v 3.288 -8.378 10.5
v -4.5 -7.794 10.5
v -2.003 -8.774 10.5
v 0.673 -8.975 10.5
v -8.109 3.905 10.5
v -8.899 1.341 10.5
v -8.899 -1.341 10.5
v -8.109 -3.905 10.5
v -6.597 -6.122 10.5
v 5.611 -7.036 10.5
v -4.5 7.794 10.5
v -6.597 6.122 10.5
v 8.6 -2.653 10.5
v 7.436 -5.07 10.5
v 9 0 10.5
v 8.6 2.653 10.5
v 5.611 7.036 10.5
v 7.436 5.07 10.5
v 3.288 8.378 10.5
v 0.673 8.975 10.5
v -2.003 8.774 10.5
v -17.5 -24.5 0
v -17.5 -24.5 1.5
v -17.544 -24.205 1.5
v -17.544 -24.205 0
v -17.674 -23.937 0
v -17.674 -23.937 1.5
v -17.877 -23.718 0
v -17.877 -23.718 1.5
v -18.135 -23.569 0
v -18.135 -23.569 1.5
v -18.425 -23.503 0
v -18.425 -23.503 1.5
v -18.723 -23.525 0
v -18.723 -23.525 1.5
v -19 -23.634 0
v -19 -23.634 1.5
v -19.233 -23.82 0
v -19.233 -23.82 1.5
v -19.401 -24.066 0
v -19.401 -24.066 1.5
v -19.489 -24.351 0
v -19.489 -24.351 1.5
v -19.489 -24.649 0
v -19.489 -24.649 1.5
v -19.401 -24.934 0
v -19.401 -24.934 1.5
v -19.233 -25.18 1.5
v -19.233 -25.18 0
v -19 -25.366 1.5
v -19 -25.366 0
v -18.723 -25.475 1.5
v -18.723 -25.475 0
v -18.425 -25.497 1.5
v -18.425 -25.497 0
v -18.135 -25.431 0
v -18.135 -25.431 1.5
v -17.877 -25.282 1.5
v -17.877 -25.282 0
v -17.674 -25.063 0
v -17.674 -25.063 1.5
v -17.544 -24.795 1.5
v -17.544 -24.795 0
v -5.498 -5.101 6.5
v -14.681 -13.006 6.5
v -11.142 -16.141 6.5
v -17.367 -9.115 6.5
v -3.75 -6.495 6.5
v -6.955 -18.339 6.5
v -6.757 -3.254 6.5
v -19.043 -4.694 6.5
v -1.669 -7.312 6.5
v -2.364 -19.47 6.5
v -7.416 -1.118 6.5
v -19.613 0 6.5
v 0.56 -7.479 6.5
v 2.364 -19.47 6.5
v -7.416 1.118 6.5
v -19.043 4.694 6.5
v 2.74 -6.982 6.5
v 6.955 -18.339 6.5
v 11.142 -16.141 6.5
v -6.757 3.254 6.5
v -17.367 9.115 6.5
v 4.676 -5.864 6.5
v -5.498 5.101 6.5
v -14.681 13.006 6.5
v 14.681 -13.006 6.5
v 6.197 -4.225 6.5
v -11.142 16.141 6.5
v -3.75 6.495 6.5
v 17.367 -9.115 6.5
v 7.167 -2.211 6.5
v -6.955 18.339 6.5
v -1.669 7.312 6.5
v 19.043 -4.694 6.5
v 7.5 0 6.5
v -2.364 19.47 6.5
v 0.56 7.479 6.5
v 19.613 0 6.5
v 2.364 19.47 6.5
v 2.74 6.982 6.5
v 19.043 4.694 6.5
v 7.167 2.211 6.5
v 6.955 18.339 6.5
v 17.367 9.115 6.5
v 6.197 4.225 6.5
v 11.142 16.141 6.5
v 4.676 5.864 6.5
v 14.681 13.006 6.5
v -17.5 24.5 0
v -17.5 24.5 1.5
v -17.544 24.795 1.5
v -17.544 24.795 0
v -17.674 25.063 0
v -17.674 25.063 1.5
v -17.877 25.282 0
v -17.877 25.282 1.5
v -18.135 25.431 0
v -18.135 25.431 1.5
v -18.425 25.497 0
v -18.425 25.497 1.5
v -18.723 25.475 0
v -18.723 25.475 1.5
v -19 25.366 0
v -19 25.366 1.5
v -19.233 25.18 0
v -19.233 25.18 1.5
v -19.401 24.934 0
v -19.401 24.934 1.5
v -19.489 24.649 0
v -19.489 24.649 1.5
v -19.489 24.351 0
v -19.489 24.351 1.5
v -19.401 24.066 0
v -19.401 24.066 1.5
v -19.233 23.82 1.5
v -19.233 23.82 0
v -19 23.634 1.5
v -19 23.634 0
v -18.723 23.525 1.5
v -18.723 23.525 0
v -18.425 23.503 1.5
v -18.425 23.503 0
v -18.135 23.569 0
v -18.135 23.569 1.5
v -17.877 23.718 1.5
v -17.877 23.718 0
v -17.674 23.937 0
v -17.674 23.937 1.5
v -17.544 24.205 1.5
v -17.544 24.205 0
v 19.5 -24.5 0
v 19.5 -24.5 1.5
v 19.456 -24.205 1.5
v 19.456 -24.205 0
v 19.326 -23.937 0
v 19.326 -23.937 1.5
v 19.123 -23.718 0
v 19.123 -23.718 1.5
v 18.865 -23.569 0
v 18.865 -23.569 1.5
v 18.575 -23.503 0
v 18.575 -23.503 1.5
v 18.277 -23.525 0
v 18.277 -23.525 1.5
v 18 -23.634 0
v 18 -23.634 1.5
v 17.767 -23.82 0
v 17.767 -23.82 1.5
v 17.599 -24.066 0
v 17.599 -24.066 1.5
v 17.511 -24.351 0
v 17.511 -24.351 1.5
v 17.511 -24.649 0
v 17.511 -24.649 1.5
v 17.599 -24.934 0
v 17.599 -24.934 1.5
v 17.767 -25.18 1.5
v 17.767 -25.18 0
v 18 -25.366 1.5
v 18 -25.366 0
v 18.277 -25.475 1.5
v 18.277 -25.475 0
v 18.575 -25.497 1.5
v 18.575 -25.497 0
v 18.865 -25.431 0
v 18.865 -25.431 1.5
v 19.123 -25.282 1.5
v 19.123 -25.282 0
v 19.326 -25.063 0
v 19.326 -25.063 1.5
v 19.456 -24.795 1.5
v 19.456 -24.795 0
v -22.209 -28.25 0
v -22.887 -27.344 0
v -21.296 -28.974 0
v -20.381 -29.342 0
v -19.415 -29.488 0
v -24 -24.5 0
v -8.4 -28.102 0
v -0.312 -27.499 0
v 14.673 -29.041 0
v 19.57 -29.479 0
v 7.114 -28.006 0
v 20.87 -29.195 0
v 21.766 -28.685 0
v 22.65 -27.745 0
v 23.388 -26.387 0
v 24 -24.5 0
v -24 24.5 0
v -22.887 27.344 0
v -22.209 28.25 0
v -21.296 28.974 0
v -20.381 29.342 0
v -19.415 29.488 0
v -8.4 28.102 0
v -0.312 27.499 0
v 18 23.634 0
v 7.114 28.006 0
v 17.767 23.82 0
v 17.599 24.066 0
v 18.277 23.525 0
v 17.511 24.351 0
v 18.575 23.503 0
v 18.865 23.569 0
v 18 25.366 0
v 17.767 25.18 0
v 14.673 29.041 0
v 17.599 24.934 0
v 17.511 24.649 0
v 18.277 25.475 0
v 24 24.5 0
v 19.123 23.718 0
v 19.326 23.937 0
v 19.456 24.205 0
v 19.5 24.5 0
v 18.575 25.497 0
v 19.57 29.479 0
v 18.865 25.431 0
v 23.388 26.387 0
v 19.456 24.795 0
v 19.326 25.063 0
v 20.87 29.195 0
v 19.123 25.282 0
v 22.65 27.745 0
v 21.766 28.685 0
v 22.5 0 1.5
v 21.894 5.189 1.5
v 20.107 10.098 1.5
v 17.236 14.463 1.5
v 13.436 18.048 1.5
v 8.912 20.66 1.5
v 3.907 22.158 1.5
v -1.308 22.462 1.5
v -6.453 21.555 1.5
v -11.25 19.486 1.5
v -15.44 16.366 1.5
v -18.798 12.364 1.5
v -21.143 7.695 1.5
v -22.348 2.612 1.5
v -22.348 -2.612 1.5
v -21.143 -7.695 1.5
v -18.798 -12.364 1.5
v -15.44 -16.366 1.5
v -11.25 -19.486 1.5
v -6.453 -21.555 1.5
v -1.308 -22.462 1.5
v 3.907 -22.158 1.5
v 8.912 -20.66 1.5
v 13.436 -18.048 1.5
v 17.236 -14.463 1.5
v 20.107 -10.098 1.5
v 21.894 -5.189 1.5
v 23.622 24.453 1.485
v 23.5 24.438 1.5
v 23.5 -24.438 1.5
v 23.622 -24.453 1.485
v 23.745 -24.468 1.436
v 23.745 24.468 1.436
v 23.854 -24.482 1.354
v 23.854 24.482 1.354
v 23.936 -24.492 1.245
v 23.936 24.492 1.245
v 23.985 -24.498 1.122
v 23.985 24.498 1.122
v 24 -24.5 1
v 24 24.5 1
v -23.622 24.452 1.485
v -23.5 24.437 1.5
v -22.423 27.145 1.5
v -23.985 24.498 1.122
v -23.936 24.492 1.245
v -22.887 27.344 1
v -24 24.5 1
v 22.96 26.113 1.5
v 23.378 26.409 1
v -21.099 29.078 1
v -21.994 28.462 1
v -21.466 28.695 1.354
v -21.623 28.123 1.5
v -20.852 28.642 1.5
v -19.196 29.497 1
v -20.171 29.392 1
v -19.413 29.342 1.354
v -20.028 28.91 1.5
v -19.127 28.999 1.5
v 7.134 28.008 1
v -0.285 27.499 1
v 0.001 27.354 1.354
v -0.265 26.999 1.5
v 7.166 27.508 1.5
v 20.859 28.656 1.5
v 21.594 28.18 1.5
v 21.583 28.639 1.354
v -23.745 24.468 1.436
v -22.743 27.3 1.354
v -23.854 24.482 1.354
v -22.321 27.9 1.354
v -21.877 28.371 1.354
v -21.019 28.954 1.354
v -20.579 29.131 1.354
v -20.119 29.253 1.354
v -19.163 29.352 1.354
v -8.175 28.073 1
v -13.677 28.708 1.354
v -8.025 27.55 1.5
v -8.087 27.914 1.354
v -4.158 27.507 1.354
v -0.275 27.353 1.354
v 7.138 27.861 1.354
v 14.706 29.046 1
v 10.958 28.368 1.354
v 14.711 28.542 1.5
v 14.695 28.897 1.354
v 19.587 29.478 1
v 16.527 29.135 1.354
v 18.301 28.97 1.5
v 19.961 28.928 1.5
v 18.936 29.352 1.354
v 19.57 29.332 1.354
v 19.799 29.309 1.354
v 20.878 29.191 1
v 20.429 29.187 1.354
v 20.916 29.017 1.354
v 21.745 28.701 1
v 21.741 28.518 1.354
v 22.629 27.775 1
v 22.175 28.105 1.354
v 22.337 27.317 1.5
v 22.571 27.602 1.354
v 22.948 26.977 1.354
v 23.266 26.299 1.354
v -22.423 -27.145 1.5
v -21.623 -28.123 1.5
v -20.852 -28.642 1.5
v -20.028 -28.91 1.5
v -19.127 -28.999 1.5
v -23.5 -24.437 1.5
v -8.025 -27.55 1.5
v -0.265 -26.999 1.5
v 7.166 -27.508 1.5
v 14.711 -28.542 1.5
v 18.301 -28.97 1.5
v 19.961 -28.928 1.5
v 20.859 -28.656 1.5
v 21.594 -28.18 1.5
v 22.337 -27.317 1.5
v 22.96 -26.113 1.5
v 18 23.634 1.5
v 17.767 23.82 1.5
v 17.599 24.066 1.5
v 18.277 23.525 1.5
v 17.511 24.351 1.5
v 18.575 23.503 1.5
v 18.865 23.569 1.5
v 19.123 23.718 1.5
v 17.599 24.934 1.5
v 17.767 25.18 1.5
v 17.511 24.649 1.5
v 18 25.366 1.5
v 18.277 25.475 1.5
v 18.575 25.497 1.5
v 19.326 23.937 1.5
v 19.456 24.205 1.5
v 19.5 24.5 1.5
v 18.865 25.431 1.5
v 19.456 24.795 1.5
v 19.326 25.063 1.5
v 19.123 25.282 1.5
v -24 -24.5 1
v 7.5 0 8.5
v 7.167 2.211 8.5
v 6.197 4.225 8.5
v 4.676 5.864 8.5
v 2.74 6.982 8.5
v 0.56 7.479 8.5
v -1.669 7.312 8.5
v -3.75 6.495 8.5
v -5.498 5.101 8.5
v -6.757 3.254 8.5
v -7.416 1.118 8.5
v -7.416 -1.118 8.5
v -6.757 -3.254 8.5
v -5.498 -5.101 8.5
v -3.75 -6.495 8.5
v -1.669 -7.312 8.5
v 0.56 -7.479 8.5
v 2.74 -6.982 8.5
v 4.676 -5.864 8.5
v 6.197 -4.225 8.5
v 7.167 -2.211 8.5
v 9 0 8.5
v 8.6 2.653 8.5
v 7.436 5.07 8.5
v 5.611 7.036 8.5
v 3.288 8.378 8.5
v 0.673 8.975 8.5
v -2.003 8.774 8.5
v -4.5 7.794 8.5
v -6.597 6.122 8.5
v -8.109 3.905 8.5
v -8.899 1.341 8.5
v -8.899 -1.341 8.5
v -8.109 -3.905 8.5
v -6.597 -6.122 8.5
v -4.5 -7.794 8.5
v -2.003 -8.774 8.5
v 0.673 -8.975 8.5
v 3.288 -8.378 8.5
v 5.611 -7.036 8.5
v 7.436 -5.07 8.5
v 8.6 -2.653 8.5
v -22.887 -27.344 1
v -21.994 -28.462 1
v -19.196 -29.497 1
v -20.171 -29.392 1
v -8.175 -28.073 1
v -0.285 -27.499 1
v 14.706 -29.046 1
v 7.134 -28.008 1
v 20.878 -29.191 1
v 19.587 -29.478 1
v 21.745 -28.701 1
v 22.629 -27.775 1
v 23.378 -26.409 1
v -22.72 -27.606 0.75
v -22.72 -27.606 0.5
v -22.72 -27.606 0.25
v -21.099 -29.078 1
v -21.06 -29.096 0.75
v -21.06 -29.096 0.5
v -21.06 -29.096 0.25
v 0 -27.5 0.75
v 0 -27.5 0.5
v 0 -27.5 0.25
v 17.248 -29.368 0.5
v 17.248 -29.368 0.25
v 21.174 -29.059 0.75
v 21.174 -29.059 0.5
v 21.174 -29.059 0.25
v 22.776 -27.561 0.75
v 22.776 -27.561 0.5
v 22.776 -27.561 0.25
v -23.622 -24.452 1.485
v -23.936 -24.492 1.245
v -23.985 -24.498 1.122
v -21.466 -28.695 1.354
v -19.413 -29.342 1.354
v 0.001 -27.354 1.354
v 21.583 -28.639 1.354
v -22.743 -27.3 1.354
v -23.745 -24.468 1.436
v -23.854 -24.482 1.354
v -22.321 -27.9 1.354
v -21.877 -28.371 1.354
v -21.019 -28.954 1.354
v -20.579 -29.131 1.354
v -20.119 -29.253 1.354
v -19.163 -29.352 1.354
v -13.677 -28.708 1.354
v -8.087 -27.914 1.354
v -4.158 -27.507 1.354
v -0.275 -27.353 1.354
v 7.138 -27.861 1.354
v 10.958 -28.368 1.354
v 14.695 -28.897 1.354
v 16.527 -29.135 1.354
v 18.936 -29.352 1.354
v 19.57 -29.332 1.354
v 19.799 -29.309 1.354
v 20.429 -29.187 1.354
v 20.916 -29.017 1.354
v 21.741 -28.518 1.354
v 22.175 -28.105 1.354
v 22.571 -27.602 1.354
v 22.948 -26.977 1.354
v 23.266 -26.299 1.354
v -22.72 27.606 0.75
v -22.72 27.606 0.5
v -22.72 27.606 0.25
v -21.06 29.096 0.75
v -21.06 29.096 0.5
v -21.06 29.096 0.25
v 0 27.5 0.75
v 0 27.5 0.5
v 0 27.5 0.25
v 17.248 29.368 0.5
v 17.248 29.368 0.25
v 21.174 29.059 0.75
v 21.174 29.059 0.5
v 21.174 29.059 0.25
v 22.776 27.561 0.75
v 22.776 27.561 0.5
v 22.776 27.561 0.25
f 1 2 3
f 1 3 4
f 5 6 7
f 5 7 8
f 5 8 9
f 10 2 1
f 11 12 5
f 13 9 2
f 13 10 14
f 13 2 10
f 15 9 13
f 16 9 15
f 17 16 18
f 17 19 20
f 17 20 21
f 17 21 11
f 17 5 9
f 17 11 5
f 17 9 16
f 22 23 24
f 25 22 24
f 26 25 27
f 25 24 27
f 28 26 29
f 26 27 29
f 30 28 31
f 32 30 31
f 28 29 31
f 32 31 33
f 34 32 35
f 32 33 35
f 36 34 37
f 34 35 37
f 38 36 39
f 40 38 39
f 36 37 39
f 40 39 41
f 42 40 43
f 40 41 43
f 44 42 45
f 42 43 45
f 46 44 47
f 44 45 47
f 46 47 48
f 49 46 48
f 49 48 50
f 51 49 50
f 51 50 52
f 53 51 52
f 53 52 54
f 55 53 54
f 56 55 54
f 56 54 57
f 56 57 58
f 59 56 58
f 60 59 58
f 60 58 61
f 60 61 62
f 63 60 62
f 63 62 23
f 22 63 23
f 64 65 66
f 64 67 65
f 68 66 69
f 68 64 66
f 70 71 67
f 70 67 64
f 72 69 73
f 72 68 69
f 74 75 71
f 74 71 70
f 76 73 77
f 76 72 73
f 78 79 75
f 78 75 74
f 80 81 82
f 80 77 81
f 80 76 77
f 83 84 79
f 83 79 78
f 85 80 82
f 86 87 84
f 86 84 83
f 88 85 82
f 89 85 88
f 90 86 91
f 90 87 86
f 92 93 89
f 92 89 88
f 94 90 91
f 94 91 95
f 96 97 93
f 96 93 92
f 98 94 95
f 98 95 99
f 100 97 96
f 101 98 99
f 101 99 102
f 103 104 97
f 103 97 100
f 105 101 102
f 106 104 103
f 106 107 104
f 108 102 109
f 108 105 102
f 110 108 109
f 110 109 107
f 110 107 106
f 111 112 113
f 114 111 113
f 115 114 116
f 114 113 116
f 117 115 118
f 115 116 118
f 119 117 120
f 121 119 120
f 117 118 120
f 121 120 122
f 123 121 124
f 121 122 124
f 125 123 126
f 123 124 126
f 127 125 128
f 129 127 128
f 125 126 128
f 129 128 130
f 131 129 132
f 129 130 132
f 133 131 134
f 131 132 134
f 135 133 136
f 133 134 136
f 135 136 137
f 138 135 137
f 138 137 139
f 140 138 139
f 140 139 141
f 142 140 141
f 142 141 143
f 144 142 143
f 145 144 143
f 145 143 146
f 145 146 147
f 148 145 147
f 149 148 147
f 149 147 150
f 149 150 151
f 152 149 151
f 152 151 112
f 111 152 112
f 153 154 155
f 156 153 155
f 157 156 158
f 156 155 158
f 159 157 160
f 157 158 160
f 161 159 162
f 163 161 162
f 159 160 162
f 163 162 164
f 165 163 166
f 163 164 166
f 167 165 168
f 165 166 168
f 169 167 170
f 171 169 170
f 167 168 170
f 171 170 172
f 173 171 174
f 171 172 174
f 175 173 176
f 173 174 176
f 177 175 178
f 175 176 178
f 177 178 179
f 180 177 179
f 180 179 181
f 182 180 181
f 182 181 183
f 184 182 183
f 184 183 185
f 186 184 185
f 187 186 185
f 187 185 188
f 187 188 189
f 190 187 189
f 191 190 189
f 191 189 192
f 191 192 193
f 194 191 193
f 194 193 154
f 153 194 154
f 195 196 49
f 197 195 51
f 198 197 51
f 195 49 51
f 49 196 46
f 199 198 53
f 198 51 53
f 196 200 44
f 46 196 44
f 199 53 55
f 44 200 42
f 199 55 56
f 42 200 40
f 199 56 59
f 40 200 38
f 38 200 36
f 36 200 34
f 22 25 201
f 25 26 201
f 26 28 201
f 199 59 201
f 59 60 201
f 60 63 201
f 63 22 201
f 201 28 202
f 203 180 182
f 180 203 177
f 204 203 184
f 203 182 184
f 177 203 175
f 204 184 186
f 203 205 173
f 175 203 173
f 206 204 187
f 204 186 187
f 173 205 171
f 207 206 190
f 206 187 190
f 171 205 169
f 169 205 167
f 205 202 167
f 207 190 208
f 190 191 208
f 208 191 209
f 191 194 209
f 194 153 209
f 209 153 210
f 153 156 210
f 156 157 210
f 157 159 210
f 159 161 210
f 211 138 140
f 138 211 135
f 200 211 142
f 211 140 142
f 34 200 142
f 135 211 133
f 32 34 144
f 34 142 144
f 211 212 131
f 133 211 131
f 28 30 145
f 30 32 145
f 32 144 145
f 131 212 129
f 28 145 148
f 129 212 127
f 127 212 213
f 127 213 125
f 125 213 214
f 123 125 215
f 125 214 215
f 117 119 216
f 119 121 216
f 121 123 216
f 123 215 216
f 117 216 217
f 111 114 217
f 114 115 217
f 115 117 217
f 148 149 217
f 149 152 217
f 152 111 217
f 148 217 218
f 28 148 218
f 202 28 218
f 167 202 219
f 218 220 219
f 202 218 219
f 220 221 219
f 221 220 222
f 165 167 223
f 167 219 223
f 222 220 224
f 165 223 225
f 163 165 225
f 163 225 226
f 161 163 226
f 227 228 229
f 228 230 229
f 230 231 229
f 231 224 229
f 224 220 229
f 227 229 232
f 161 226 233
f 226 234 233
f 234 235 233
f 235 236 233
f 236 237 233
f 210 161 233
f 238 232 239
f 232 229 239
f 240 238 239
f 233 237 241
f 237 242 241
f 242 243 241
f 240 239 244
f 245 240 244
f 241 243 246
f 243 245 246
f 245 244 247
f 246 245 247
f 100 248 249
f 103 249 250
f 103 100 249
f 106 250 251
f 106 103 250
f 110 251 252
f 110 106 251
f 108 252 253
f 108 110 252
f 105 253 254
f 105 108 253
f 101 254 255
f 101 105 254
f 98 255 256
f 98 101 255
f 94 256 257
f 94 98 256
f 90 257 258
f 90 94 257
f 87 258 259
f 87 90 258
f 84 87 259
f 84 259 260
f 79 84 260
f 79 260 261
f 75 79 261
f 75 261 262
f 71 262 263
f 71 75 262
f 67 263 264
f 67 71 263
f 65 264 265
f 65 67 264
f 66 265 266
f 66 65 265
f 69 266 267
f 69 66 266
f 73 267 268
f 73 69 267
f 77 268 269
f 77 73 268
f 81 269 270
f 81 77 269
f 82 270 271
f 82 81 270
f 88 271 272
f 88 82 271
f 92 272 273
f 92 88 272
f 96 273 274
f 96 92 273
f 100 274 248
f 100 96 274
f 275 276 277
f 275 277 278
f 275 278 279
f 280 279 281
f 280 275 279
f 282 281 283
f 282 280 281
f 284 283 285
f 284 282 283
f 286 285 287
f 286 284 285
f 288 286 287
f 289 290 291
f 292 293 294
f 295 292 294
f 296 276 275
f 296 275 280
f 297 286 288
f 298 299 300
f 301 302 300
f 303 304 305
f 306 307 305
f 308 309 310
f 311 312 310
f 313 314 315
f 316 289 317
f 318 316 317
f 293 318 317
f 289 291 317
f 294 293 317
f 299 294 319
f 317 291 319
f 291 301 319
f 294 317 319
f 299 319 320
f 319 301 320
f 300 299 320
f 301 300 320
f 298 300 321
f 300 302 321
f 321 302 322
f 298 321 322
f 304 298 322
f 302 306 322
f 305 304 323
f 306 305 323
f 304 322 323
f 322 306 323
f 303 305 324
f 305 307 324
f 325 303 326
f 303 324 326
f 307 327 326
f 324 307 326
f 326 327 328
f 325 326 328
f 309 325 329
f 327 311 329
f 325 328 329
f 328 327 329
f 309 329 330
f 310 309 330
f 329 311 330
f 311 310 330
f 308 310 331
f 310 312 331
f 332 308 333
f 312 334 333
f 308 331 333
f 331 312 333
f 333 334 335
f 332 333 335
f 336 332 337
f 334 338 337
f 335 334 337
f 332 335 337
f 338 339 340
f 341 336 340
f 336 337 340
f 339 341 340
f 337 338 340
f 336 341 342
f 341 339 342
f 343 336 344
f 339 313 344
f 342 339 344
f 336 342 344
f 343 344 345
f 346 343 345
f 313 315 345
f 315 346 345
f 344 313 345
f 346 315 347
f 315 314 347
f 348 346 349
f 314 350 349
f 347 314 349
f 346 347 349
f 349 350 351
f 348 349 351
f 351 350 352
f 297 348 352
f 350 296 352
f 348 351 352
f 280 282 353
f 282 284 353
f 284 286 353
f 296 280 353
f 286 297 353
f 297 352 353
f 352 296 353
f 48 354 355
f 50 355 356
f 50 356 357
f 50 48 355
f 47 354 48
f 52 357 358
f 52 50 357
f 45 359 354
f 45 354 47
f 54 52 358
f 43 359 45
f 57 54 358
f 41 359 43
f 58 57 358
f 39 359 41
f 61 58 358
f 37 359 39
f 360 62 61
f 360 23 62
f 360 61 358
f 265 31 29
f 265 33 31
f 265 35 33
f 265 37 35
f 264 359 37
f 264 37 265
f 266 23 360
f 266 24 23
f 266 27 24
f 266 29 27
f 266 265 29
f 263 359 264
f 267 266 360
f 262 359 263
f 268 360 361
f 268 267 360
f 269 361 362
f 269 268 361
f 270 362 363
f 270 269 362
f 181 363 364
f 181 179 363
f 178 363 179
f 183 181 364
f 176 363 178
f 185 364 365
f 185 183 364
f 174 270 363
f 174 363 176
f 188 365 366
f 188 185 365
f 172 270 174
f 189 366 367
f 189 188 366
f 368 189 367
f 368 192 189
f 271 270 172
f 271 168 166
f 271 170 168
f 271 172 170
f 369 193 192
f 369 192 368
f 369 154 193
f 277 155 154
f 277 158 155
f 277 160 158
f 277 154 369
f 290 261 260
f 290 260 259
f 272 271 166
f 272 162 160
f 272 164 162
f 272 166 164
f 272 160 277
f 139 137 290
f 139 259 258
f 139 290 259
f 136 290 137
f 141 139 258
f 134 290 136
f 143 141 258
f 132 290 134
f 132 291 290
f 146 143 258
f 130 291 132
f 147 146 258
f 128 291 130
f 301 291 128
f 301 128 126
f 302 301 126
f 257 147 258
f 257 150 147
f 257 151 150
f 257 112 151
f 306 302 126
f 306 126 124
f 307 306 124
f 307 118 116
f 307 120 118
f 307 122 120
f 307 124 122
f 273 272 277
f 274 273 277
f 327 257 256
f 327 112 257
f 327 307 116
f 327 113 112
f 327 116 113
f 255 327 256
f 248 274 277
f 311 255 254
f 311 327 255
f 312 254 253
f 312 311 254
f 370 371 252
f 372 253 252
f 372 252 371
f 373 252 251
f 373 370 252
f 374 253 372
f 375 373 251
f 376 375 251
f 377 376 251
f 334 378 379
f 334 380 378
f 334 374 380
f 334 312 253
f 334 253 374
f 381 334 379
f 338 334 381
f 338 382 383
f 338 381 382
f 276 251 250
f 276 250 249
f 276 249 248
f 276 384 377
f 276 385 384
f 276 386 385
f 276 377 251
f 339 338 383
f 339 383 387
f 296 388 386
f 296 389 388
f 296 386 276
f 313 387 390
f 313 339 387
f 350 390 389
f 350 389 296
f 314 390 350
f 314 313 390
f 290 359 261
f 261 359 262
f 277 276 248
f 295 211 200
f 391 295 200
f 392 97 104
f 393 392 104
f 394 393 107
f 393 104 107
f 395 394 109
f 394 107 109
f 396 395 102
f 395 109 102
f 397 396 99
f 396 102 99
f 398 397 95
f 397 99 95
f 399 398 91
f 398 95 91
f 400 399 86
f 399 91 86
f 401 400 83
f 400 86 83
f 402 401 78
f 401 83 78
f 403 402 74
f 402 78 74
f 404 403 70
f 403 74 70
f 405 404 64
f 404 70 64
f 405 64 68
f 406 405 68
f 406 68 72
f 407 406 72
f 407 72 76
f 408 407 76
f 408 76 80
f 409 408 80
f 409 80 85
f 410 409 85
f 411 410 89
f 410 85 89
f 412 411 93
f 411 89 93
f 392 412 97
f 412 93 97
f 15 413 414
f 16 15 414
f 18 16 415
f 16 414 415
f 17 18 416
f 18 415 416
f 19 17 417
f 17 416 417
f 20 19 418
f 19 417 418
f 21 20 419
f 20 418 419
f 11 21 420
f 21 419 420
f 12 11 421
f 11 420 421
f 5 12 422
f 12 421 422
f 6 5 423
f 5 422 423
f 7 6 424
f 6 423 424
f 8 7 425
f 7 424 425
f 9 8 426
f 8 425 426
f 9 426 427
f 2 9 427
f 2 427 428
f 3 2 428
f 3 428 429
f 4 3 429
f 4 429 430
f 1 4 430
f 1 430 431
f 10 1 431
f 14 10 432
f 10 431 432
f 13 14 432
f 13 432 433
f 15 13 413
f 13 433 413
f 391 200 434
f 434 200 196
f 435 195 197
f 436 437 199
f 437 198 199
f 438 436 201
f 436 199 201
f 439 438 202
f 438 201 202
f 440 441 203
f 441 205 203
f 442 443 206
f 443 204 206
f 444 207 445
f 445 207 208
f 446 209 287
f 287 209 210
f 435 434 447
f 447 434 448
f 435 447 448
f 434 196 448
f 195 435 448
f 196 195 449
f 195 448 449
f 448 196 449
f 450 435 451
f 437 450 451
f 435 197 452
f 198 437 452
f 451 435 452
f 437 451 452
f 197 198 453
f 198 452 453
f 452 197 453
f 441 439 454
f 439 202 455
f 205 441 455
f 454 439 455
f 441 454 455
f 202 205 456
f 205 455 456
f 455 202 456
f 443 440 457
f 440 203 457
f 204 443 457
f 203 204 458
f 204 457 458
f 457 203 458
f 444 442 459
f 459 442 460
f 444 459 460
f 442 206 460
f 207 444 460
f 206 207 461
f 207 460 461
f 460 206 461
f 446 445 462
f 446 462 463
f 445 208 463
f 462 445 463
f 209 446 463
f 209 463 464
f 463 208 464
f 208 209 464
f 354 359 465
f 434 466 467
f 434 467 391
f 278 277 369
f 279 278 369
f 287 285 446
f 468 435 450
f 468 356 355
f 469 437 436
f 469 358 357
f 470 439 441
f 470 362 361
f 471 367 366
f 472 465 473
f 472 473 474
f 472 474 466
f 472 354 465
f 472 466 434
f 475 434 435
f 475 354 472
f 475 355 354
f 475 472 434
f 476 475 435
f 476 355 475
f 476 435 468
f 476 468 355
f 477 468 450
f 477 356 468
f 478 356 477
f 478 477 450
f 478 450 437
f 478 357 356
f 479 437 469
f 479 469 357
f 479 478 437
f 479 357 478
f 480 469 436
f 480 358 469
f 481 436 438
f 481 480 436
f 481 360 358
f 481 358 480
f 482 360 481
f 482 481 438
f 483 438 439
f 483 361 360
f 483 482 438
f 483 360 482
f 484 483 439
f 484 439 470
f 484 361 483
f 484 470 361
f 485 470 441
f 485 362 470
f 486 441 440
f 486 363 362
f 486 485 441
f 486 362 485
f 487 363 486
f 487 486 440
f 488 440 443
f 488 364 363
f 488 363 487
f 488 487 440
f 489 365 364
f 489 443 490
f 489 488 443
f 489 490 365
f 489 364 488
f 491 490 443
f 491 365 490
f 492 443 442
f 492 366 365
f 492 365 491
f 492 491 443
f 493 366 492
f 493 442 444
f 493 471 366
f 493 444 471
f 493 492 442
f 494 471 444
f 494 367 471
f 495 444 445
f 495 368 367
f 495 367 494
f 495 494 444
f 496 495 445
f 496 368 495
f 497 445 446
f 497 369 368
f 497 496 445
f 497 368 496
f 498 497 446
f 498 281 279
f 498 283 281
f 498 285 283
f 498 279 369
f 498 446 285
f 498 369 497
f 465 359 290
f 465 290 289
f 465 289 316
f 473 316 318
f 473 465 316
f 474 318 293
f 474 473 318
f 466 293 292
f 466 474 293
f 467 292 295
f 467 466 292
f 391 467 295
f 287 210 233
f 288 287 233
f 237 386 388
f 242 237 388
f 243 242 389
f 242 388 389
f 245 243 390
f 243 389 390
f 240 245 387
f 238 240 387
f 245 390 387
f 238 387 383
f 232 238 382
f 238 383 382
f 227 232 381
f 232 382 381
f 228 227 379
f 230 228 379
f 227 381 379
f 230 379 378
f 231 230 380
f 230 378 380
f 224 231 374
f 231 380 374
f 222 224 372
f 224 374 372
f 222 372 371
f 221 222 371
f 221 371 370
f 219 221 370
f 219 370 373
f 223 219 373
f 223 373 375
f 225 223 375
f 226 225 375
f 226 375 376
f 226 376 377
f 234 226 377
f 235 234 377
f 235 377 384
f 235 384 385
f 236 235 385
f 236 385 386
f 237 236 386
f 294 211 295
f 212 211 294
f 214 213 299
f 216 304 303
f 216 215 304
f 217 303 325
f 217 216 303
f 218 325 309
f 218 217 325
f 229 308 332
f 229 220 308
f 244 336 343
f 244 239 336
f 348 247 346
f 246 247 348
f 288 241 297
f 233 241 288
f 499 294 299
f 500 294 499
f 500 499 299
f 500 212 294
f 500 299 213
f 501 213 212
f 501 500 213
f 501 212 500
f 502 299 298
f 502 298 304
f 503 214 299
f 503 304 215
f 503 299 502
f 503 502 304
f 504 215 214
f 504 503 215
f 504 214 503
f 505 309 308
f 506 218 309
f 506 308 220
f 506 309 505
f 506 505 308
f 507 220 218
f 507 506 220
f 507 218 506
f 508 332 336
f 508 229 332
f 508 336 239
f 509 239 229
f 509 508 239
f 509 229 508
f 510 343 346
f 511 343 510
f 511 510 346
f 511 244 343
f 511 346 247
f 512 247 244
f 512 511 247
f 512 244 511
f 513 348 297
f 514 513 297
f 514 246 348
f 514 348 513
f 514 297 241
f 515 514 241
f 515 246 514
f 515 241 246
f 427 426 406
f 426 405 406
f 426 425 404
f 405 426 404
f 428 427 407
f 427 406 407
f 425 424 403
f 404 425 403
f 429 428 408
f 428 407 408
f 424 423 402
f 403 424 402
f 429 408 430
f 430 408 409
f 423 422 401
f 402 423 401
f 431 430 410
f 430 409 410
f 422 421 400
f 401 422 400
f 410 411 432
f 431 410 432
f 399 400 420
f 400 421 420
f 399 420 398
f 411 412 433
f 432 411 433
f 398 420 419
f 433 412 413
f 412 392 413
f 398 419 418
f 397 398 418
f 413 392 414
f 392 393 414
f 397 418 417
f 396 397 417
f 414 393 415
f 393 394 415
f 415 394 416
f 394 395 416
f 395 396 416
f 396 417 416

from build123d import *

# Parameters (mm, degrees)
BOSS_EXTRUDE1_DEPTH = 1.5
SKETCH2_R           = 22.5
BOSS_EXTRUDE4_DEPTH = 5
BOSS_EXTRUDE4_TAPER = 30
SKETCH3_R           = 7.5
BOSS_EXTRUDE5_DEPTH = 2
SKETCH4_R           = 9
BOSS_EXTRUDE7_DEPTH = 2
FILLET4_R           = 0.5
SKETCH5_R           = 1
CUT_EXTRUDE1_DEPTH  = 2


with BuildPart() as part:
    # Sketch1 → Boss-Extrude1 (new body)
    with BuildSketch(Plane.XY):
        with BuildLine():
            Line((-24, 24.5), (-24, -24.5))
            add(Edge.make_bspline(
                [(-24, -24.5), (-22.605605166, -29.952275609), (-14.106399585, -29.149385859), (-0.230857067, -26.321865732), (15.046005443, -29.389446711), (22.664200818, -29.845368103), (24, -24.5)],
                knots=[0, 0, 0, 0, 0.159886605, 0.492954102, 0.826021599, 1, 1, 1, 1], degree=3))
            Line((24, -24.5), (24, 24.5))
            add(Edge.make_bspline(
                [(-24, 24.5), (-22.605605166, 29.952275609), (-14.106399585, 29.149385859), (-0.230857067, 26.321865732), (15.046005443, 29.389446711), (22.664200818, 29.845368103), (24, 24.5)],
                knots=[0, 0, 0, 0, 0.159886605, 0.492954102, 0.826021599, 1, 1, 1, 1], degree=3))
        make_face()
    extrude(amount=BOSS_EXTRUDE1_DEPTH)

    # Sketch2 → Boss-Extrude4 (add)
    with BuildSketch(Plane.XY.offset(1.5)):
        Circle(SKETCH2_R)
    extrude(amount=BOSS_EXTRUDE4_DEPTH, taper=BOSS_EXTRUDE4_TAPER)

    # Sketch3 → Boss-Extrude5 (add)
    with BuildSketch(Plane.XY.offset(6.5)):
        Circle(SKETCH3_R)
    extrude(amount=BOSS_EXTRUDE5_DEPTH)

    # Sketch4 → Boss-Extrude7 (add)
    with BuildSketch(Plane.XY.offset(8.5)):
        Circle(SKETCH4_R)
    extrude(amount=BOSS_EXTRUDE7_DEPTH)

    # Fillet4
    fillet4_edges = [part.edges().sort_by_distance(p)[0] for p in [
        (-24, 0, 1.5),
        (0.007188855, 27.500047519, 1.5),
        (0.007188855, -27.500047519, 1.5),
        (24, 0, 1.5),
    ]]
    fillet(fillet4_edges, radius=FILLET4_R)

    # Sketch5 → Cut-Extrude1 (cut)
    with BuildSketch(Plane.XY.offset(1.5)):
        with Locations((18.5, -24.5)):
            Circle(SKETCH5_R)
        with Locations((-18.5, -24.5)):
            Circle(SKETCH5_R)
        with Locations((18.5, 24.5)):
            Circle(SKETCH5_R)
        with Locations((-18.5, 24.5)):
            Circle(SKETCH5_R)
    extrude(amount=-CUT_EXTRUDE1_DEPTH, mode=Mode.SUBTRACT)


solid = part.part
